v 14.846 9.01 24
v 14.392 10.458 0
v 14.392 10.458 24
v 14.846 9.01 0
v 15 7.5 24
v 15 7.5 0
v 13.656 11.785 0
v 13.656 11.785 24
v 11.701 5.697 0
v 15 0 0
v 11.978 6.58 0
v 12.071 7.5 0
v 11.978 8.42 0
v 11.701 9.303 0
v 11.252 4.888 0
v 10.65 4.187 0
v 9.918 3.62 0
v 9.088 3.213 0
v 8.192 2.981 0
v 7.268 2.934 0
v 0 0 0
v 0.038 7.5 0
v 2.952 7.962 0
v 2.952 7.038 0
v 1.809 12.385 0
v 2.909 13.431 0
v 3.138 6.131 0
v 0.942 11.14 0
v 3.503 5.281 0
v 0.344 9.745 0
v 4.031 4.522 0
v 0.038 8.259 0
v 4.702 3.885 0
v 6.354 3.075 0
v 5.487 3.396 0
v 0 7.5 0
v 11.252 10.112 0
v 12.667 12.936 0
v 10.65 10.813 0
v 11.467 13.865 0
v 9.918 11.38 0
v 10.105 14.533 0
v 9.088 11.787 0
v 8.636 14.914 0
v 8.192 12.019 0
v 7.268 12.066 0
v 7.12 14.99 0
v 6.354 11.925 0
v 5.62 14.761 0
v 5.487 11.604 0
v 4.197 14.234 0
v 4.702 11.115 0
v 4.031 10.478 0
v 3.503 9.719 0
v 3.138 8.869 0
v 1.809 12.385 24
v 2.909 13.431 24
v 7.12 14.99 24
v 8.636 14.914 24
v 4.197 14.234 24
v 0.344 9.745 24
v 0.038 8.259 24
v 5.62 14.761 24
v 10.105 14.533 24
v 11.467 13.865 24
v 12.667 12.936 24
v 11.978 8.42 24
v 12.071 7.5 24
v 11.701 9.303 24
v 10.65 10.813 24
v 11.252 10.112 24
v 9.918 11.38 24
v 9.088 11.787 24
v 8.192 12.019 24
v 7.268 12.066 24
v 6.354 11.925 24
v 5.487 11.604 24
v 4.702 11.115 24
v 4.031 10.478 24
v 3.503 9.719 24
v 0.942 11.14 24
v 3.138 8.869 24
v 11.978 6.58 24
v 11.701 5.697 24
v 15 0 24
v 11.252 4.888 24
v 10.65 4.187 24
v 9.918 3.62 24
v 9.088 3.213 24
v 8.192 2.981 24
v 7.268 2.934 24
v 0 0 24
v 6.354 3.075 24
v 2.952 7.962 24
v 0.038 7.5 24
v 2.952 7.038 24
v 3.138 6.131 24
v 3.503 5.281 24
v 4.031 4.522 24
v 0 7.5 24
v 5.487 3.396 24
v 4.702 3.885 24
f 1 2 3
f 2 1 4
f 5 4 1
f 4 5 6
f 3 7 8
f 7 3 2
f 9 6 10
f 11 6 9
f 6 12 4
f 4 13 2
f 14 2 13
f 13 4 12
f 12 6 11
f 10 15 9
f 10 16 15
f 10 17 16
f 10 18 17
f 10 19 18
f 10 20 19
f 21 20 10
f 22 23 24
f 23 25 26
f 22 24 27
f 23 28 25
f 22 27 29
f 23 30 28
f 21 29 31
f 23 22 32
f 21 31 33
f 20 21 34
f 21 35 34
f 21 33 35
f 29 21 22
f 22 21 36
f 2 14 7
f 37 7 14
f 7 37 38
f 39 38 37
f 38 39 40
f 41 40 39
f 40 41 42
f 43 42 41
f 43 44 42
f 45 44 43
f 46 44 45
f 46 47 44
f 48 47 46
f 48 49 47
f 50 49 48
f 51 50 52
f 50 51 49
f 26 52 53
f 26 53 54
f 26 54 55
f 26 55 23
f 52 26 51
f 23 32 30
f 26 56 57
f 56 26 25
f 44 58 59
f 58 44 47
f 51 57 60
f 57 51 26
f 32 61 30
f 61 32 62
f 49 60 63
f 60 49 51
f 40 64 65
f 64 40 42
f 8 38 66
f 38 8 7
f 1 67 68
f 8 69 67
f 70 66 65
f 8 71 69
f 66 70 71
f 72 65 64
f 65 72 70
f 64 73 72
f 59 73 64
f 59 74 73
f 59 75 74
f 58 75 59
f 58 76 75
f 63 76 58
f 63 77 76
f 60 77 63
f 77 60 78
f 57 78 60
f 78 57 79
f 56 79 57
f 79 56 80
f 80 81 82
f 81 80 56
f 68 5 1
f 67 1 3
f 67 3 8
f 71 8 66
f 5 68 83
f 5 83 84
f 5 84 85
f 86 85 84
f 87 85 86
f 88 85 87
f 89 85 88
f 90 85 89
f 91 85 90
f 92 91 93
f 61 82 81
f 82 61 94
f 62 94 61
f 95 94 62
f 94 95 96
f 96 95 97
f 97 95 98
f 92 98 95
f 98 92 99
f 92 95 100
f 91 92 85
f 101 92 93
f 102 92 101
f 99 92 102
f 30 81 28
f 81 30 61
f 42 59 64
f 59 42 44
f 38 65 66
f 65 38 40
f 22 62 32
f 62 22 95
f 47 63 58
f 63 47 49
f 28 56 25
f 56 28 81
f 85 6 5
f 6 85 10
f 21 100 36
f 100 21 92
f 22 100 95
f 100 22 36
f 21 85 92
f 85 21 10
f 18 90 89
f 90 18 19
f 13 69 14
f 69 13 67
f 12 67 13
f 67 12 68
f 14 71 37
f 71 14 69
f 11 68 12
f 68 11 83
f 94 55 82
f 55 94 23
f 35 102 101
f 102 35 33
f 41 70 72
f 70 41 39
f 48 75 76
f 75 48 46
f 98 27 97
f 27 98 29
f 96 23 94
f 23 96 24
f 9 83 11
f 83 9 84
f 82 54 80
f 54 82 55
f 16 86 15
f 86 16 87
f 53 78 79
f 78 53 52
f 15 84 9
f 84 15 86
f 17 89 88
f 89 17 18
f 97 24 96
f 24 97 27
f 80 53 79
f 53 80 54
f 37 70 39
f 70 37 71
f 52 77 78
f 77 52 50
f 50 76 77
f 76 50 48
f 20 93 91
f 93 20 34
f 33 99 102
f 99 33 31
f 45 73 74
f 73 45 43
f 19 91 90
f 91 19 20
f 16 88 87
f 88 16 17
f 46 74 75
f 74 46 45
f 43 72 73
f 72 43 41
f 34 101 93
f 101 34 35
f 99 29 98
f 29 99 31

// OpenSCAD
// file: config.scad
// This is the config for an M8 Mendel sized printer.

buildx = 200; //build area on the x axis
buildy = 200; //build area on the y axis
buildz = 120; //build area on the z axis

frameroddia = 9; //the frame rod diameter
smoothroddia = 8; //the smooth rod diameter
bushingod = 15; //The prusabushing OD, you can change this to 15 to use LM8UU linear bearings 
bushingheight = 24; 

nemasize = 1.7; //Nema Size TODO just make this 17, 23,14 etc
motorcenter = 23; //center hole size for the motor mount. If your motor center flange is smaller you can beef up parts this way. 
motorshaftdia = 5; // Motor shaft diameter
motorshaftlength = 22;
motorbody = 43;

pulleypitch = 5; //trapezoidal pulley script TODO
pulleyteeth = 8; 
beltwidth = 6; // Belt width 

/* The Mixtape Mendel uses two types of fasteners. One is the "primary" type, which is the larger type that builds the structure,
 which was profiled above as "frameroddia, etc..". In the case of the Mendel, it is M8 threaded rod (Huxley, M6). It also uses "Secondary" hardware. This is a smaller screw which normally corerelates with the motor screw used.
*/
nutheight = 7; //Primary
nutapothem = 13; //Primary nut apothem (wrench size)

secscrewdia = 4; //secondary 
secscrewheaddia = 6; //secondary screw head diameter
secscrewheadheight = 3; //secondary screw head height
secnutapothem = 5.5; //secondary nut apothem (wrench size)
secnutheight = 2.4; //secondary

zipheight = 2; //ziptie height
zipwidth = 4; //ziptie width

mdfthick = 6; //thickness of MDF (You can use other wood, acrylic, lexan, etc)

bearingid = 8; // 608
bearingod = 22; // 608
bearinginnerrace = 12; // the amount of the inner race diameter exposed

layerheight = 0.32; //skeinforge/slicer layer height, used for the idler wasers right now. 

//Groove Mount
	//Default is pretty good for MakerGear insulators
groovedia = 12;
grooveheight = 4.5;



/*
Below here are reworld correlations based on user specified input above and constants.
*/

//belt thickness
beltthick = (pulleypitch == 5) ? 2.2 : (pulleypitch == 5.08) ? 2.3 : (pulleypitch == 2.5) ? 1.3 : 1.14;
//XL = 2.3
//MXL = 1.14
//T2.5 = 1.3
//T5 = 2.2

pi = 3.141592654;
// main file
/*
  Mixtape Mendel - A Fully Parametric RepRap
    Copyright (C) 2011  Steve Kelly

    This program is free software: you can redistribute it and/or modify
    it under the terms of the GNU General Public License as published by
    the Free Software Foundation, either version 3 of the License, or
    (at your option) any later version.

    This program is distributed in the hope that it will be useful,
    but WITHOUT ANY WARRANTY; without even the implied warranty of
    MERCHANTABILITY or FITNESS FOR A PARTICULAR PURPOSE.  See the
    GNU General Public License for more details.

    You should have received a copy of the GNU General Public License
    along with this program.  If not, see <http://www.gnu.org/licenses/>.
*/

include <config.scad>;
$fn = 31;

union(){

	difference(){
		
		union(){

			//make the bushing outer bits
			translate([bushingod/2,bushingod/2,0])cylinder(r=bushingod/2, h = bushingheight);
			cube([bushingod,bushingod/2,bushingheight]);	

		}

		//subtract the smooth rod diameter
		translate([bushingod/2,bushingod/2,-1])cylinder(r=smoothroddia/1.75, h = bushingheight+2);

	}
	
}
